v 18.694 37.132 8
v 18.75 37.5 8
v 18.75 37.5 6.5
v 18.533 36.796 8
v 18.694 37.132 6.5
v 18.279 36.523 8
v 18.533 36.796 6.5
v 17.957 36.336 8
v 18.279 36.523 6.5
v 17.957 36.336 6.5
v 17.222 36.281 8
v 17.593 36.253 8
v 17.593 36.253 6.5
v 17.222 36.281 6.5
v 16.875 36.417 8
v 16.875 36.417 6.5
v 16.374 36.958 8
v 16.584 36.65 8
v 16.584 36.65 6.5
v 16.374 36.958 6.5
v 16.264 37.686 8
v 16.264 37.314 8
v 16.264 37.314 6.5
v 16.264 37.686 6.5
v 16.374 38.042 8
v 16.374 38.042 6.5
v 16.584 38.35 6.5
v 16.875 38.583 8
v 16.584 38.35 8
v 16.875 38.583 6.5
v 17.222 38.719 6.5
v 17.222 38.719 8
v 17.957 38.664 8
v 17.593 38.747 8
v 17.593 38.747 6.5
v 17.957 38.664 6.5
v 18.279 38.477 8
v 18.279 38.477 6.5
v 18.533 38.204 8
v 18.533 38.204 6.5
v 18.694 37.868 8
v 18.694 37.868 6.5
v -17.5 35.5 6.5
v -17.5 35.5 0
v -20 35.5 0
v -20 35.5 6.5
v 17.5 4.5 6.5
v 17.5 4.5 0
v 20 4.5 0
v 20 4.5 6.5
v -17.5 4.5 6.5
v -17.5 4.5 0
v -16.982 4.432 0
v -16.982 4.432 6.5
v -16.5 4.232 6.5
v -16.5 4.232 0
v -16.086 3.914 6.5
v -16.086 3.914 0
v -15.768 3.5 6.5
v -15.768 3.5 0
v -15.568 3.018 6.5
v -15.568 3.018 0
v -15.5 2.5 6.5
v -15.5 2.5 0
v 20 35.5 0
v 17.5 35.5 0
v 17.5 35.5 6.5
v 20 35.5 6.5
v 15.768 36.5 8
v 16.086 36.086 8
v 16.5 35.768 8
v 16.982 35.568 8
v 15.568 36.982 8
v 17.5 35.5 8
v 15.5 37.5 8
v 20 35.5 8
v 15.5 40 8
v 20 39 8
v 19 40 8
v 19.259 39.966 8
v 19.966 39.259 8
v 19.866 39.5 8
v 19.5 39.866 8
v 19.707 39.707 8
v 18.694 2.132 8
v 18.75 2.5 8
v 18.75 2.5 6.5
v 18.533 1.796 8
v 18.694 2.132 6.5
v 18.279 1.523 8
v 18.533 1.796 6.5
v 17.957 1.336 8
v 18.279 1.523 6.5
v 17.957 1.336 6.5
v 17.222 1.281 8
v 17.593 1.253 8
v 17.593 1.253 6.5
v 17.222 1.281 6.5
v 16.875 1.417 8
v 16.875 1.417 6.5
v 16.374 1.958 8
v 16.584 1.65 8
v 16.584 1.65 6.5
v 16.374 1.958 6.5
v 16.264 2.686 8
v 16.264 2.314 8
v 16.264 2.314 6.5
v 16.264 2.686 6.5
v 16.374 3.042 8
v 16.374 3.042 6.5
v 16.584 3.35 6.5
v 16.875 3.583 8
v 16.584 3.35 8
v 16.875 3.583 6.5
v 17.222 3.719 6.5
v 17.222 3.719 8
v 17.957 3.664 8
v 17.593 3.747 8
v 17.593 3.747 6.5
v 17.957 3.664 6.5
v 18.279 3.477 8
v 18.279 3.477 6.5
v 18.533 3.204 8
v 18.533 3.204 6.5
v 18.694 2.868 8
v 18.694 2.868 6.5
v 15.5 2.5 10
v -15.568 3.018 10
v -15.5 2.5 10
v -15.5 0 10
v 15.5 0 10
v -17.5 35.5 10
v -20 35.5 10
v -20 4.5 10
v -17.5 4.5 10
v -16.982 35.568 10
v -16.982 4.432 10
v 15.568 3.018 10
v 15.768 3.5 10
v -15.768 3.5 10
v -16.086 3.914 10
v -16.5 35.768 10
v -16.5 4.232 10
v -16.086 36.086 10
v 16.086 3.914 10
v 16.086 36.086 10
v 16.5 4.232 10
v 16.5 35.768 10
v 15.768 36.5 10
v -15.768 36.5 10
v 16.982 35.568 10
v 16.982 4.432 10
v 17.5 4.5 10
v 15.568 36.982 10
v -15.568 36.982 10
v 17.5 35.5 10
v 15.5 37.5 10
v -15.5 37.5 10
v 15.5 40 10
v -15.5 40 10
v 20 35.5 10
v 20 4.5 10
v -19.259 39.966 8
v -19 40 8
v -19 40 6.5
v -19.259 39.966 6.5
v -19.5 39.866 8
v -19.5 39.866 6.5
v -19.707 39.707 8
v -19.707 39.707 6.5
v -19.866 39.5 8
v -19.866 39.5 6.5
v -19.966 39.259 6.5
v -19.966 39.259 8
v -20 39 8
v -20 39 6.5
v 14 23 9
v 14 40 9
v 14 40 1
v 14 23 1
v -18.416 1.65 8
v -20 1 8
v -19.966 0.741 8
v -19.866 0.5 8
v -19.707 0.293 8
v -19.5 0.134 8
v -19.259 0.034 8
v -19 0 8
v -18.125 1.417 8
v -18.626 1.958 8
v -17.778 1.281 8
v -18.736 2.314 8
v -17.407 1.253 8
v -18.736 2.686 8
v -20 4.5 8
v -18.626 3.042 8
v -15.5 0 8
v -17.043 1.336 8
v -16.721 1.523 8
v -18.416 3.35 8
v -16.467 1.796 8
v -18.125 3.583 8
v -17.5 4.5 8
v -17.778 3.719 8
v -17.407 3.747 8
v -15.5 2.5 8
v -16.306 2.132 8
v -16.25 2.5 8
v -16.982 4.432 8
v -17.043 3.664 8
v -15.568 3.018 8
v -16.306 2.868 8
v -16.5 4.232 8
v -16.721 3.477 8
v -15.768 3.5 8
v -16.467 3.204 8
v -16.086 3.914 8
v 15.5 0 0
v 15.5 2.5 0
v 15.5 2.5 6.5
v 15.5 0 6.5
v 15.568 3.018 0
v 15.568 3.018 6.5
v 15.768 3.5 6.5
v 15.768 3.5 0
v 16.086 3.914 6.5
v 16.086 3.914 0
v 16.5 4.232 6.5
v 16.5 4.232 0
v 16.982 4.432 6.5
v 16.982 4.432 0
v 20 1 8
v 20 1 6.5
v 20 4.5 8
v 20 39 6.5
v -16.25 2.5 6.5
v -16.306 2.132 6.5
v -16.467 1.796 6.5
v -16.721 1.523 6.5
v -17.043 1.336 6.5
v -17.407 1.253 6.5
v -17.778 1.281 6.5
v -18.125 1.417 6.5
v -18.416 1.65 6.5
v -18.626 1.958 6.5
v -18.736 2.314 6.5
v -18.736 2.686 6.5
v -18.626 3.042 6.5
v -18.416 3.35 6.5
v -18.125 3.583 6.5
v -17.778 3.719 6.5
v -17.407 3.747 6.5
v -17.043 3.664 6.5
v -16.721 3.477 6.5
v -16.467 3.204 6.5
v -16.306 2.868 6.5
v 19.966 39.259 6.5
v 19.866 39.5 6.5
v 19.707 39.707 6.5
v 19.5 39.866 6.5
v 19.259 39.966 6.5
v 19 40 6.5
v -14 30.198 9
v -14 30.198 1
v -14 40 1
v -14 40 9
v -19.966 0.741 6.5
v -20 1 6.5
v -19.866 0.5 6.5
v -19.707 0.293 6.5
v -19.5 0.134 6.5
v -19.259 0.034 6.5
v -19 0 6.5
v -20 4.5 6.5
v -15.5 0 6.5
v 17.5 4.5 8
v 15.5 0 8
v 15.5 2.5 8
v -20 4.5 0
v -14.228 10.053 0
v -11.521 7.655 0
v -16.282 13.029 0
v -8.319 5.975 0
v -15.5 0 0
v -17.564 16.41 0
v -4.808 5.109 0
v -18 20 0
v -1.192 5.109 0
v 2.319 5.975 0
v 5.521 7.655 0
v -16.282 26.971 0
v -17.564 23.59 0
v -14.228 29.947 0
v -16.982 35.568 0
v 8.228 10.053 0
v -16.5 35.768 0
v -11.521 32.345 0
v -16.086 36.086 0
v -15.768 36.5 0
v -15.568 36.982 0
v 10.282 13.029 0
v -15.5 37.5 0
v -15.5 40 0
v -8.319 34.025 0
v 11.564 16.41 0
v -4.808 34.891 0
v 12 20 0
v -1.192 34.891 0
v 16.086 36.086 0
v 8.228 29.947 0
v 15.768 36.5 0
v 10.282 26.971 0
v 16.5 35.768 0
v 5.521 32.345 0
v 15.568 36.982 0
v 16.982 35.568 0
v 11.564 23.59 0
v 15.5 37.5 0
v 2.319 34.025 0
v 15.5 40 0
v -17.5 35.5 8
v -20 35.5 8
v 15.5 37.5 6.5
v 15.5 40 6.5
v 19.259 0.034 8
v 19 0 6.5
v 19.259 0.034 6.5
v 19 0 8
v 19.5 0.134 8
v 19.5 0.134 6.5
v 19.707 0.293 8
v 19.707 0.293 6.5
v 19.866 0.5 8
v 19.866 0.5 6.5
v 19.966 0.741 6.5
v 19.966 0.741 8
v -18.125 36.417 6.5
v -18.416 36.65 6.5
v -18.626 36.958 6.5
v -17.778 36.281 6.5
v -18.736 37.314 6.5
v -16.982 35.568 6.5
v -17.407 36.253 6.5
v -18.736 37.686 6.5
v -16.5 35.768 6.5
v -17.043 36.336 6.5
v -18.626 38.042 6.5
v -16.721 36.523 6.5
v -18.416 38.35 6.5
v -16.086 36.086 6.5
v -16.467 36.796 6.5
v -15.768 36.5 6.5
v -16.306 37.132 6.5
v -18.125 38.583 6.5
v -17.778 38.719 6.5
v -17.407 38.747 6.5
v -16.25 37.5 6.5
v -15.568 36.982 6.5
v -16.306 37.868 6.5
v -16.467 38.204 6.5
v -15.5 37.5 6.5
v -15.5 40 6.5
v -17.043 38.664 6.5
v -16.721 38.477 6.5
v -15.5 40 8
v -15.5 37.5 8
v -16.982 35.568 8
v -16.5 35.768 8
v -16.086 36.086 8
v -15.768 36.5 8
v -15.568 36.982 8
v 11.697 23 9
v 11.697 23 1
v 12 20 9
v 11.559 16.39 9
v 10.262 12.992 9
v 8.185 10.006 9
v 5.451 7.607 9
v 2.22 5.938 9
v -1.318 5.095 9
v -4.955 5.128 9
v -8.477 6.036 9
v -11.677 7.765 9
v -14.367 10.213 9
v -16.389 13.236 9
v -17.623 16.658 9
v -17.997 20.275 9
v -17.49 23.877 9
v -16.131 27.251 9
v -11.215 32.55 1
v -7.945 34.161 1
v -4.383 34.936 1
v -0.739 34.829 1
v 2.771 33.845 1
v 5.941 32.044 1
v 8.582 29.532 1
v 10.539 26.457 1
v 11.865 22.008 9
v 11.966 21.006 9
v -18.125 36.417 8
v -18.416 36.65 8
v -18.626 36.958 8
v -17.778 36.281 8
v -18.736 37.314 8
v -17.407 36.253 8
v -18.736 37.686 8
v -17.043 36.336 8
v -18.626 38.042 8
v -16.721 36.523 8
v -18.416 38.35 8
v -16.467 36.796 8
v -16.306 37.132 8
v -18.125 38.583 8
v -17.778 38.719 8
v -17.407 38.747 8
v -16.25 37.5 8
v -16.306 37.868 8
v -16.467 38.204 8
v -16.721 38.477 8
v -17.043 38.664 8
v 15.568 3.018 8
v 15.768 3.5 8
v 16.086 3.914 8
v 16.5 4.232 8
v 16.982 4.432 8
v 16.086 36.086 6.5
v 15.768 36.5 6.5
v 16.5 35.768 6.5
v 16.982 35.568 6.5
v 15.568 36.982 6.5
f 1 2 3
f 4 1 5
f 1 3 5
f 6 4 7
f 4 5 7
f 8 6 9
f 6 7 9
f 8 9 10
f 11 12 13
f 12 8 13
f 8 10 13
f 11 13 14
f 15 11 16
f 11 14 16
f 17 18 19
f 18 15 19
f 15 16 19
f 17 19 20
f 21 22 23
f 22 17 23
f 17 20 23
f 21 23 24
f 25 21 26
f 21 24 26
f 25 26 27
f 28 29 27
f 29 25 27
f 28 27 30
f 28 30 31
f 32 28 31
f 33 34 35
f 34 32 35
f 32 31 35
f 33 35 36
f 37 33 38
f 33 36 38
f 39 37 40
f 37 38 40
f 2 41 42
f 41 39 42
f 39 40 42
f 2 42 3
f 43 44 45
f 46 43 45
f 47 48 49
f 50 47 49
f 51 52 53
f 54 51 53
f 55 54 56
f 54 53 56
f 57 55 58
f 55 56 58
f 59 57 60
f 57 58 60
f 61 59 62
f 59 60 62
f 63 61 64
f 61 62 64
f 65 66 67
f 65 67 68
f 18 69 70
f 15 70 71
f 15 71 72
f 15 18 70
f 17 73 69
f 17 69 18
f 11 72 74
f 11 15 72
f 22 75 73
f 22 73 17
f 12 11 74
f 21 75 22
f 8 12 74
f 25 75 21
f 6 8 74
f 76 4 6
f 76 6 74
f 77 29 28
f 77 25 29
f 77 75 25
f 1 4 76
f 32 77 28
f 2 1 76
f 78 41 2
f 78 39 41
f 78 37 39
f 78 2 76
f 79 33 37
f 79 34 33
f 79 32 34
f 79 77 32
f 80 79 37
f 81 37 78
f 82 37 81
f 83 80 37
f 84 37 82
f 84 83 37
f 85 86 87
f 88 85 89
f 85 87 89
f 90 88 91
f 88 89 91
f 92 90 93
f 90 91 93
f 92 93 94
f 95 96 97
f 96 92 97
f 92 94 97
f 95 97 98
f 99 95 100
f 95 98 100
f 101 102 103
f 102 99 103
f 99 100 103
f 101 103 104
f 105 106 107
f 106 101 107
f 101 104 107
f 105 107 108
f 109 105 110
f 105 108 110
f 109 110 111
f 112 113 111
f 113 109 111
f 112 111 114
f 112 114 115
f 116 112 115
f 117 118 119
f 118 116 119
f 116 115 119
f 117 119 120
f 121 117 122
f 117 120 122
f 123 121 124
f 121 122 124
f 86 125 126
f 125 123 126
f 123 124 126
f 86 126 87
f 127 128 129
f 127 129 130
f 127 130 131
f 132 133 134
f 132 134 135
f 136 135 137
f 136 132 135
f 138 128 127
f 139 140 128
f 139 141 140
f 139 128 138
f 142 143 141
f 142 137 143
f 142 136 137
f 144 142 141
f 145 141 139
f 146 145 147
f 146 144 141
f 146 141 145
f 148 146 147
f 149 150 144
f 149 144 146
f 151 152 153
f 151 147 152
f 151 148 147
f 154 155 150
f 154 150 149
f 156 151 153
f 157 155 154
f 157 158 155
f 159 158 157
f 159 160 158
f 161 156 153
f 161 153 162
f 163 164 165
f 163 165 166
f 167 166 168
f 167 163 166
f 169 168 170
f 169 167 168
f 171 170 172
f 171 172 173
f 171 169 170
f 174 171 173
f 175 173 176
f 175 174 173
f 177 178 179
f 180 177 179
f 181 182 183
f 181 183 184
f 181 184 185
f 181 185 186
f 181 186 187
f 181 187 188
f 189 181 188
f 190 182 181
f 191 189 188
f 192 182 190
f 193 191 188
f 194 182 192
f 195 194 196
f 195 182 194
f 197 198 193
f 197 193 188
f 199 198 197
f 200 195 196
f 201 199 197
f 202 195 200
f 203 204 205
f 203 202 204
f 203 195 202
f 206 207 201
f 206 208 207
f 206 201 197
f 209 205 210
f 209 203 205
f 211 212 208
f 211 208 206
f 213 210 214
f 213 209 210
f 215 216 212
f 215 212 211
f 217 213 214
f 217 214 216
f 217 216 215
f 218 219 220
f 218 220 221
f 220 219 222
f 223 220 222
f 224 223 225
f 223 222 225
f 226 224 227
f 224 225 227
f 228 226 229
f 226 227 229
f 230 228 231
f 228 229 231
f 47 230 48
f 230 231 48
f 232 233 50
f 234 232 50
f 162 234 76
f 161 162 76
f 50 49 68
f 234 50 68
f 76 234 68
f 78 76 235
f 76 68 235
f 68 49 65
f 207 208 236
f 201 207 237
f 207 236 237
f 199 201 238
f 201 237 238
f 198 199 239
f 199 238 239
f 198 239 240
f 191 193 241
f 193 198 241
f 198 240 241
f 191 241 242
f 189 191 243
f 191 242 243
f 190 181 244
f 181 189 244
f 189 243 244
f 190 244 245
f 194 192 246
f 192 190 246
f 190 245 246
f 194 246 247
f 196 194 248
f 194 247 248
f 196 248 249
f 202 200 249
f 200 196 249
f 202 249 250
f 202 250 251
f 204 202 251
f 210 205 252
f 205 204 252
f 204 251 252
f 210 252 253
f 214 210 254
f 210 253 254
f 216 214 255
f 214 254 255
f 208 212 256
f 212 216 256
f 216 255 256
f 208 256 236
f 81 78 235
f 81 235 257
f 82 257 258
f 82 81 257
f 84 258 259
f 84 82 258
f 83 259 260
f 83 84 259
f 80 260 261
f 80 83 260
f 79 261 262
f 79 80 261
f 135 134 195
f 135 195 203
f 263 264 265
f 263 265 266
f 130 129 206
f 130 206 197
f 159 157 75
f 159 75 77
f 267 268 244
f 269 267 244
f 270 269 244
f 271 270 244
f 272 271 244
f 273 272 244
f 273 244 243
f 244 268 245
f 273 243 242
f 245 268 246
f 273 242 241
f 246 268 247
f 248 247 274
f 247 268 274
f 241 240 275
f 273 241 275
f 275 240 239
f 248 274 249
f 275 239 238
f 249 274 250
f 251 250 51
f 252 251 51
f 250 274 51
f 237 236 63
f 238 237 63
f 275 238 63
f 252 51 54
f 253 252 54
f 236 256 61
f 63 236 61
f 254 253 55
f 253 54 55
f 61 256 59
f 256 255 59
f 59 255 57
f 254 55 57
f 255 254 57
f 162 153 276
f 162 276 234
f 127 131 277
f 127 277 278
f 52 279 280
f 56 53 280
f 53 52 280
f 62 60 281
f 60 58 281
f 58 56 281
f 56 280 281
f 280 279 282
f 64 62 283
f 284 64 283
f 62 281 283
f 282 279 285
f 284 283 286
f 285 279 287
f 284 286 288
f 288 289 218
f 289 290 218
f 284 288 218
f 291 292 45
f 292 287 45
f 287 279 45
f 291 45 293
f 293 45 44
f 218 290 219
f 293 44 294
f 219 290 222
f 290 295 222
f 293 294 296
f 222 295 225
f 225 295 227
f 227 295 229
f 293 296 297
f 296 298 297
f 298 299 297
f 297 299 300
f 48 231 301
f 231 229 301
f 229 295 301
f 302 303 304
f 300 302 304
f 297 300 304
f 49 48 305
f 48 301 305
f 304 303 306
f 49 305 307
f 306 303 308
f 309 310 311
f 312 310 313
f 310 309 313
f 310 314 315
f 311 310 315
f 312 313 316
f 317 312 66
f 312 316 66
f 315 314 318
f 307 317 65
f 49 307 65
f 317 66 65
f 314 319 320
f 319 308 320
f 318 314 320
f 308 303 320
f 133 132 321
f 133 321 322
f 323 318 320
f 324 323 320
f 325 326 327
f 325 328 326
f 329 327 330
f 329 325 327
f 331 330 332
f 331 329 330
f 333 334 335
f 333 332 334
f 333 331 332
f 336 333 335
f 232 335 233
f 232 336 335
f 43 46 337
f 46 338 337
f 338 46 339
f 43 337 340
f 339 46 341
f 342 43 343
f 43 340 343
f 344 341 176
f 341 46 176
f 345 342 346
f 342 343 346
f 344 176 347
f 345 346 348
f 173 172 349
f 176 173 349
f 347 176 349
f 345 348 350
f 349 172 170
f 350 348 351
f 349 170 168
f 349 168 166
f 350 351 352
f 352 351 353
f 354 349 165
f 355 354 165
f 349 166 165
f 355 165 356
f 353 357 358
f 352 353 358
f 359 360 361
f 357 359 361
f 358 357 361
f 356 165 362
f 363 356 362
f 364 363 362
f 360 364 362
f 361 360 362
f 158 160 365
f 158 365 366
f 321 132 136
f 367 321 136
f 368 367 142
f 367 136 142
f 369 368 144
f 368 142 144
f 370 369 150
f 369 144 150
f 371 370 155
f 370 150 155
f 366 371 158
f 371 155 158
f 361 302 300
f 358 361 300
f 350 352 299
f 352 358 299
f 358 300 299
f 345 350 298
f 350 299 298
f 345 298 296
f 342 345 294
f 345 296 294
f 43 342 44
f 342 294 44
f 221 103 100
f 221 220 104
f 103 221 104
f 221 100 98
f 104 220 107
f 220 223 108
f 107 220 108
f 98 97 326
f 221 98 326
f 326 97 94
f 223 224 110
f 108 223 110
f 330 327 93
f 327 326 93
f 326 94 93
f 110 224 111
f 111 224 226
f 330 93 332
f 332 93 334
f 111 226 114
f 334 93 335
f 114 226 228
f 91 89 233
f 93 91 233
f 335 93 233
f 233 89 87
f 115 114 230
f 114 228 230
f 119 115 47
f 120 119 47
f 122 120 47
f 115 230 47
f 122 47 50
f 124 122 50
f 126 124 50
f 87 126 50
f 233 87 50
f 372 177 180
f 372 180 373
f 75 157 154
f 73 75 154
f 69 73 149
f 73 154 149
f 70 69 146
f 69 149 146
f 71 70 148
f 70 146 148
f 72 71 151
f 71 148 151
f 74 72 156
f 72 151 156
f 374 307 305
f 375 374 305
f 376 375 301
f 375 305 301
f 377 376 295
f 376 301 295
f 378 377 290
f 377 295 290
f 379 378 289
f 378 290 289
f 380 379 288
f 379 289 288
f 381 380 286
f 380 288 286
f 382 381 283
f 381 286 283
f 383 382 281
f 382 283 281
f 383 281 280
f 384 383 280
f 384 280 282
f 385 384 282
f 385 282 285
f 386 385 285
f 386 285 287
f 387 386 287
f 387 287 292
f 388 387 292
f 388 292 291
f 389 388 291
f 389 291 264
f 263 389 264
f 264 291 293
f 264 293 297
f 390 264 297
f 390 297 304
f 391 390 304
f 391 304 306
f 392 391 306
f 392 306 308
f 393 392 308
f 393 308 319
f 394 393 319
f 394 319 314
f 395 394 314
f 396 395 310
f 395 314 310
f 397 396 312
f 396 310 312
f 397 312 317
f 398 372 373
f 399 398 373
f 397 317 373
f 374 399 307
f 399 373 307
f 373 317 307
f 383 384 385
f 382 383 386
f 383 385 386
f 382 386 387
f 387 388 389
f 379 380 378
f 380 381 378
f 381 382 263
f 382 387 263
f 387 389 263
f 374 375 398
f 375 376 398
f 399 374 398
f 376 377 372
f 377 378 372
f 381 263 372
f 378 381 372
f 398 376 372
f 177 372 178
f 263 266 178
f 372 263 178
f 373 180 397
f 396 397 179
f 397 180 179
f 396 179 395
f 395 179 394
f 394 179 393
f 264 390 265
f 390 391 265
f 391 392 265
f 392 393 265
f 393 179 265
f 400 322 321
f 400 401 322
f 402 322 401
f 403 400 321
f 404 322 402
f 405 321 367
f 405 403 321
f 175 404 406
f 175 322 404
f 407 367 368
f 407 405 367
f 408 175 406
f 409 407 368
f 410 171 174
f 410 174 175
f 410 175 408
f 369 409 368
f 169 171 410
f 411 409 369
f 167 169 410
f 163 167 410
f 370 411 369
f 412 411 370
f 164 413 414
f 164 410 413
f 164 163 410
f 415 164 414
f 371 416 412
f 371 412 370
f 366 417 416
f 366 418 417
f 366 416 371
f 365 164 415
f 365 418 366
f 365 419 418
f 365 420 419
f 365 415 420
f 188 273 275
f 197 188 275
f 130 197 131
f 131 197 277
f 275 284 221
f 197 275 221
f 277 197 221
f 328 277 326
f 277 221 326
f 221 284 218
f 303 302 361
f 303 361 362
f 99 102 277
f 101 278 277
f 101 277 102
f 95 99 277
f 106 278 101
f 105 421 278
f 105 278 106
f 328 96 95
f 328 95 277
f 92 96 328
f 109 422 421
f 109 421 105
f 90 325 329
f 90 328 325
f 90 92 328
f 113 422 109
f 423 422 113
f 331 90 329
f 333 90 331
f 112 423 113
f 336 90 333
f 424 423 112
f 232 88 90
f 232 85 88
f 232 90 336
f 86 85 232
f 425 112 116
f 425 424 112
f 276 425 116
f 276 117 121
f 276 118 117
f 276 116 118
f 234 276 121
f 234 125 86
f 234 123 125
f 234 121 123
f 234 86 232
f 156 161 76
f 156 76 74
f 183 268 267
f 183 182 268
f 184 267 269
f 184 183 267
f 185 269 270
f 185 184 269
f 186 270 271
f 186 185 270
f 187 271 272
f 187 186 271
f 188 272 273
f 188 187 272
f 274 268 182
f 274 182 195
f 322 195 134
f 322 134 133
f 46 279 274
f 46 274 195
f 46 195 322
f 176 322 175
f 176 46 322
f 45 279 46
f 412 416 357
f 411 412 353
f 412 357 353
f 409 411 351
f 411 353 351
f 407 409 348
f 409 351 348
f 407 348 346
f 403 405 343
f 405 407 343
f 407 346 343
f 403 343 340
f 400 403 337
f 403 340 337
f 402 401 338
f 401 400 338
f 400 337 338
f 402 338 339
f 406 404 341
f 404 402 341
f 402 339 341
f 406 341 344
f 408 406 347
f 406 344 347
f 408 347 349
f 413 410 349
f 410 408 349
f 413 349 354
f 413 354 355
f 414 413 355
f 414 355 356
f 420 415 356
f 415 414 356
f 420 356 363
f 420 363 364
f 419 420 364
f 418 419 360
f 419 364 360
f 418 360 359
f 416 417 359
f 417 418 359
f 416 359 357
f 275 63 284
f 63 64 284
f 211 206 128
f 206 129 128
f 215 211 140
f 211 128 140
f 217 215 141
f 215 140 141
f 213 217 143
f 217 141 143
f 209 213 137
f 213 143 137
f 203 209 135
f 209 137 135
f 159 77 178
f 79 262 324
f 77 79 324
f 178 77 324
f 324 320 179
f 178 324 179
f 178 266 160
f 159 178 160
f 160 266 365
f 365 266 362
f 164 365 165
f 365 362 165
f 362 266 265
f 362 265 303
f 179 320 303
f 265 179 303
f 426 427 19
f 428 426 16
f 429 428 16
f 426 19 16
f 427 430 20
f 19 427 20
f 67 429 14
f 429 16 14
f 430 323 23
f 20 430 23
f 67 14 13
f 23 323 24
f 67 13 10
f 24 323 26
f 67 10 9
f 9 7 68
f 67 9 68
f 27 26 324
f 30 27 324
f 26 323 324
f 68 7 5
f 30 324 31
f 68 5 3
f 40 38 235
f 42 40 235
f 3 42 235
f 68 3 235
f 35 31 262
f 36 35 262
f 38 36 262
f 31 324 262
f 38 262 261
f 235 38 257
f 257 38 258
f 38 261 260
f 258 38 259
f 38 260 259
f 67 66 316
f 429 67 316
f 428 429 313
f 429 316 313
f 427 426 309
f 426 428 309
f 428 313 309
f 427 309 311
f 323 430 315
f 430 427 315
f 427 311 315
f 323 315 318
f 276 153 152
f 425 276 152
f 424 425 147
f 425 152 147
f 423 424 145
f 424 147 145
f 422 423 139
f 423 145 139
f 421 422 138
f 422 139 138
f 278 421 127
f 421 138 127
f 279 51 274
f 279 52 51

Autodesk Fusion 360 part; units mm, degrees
sketch "Sketch1" plane through (0, 0, 0) normal (0, 0, 1) x (1, 0, 0)
  line L0 (0, 0) -> (20, 0)
  line L1 (20, 0) -> (20, 40)
  line L2 (20, 40) -> (0, 40)
  line L3 (0, 40) -> (0, 0)
  line L4 (0, 0) -> (-20, 0)
  line L5 (-20, 0) -> (-20, 40)
  line L6 (-20, 40) -> (0, 40)
  line L7 (0, 40) -> (0, 0)
  circle A0 centre (-3, 20) radius 15
  circle A1 centre (17.5, 37.5) radius 2
  circle A2 centre (-17.5, 37.5) radius 2
  circle A3 centre (-17.5, 2.5) radius 2
  circle A4 centre (17.5, 2.5) radius 2
  line L8 (17.5, 37.5) -> (17.5, 2.5) construction
  line L9 (17.5, 2.5) -> (-17.5, 2.5) construction
  line L10 (-17.5, 37.5) -> (17.5, 37.5) construction
  circle A5 centre (17.5, 37.5) radius 1.25
  circle A6 centre (-17.5, 37.5) radius 1.25
  circle A7 centre (-17.5, 2.5) radius 1.25
  circle A8 centre (17.5, 2.5) radius 1.25
  line L11 (15.5, 37.5) -> (15.5, 40)
  line L12 (17.5, 35.5) -> (20, 35.5)
  line L13 (17.5, 4.5) -> (20, 4.5)
  line L14 (15.5, 2.5) -> (15.5, 0)
  line L15 (-15.5, 2.5) -> (-15.5, 0)
  line L16 (-17.5, 4.5) -> (-20, 4.5)
  line L17 (-17.5, 35.5) -> (-20, 35.5)
  line L18 (-15.5, 37.5) -> (-15.5, 40)
  dimension "d1" = 40
  dimension "d2" = 40
  dimension "d5" = 30
  dimension "d14" = 17.5
  dimension "d16" = 2.5
  dimension "d17" = 2.5
  dimension "d18" = 2.5
  dimension "d19" = 4
  dimension "d29" = 20
  dimension "d30" = 17
extrude "Extrude1" add sketch "Sketch1" along normal blind 10 contours L0 L1 L2 L3 L7 A0 A1 A4 L11 L12 L13 L14 | L3 L4 L5 L6 L7 A0 A2 A3 L15 L16 L17 L18 | L0 L1 A4 L13 L14 | L3 L7 A0 | L3 L7 A0 | L4 L5 A3 L15 L16 | A4 | A3 | L1 L2 A1 L11 L12 | L5 L6 A2 L17 L18 | A1 | A2 | A5 | A6 | A7 | A8
extrude "Extrude2" cut sketch "Sketch1" along normal blind 9 contours L3 L7 A0 | L3 L7 A0
sketch "Sketch2" plane through (0, 40, 0) normal (0, 1, 0) x (-1, 0, 0)
  line L0 (-20, 0) -> (20, 0)
  line L1 (20, 0) -> (20, 10)
  line L2 (20, 10) -> (-20, 10)
  line L3 (-20, 10) -> (-20, 0)
  line L4 (-14, 1) -> (14, 1)
  line L5 (14, 1) -> (14, 9)
  line L6 (14, 9) -> (-14, 9)
  line L7 (-14, 9) -> (-14, 1)
  line L8 (-14, 1) -> (14, 9) construction
  line L9 (14, 1) -> (-14, 9) construction
  line L10 (0, 5) -> (0, 0) construction
  line L11 (0, 5) -> (-20, 5) construction
  point P0 (0, 5)
  dimension "d9" = 28
  dimension "d10" = 8
extrude "Extrude3" cut sketch "Sketch2" against normal blind 17 contours L4 L5 L6 L7
extrude "Extrude4" cut sketch "Sketch1" along normal blind 6.5 contours L0 L1 A4 L13 L14 | L4 L5 A3 L15 L16 | A4 | A3 | L1 L2 A1 L11 L12 | L5 L6 A2 L17 L18 | A1 | A2 | A5 | A6 | A7 | A8
extrude "Extrude5" cut sketch "Sketch1" along normal blind 44 contours A5 | A6 | A7 | A8
sketch "Sketch3" plane through (0, 0, 10) normal (0, 0, 1) x (1, 0, 0)
  circle A0 centre (-17.5, 37.5) radius 1.25
  circle A1 centre (-17.5, 2.5) radius 1.25
  circle A2 centre (17.5, 37.5) radius 1.25
  circle A3 centre (17.5, 2.5) radius 1.25
  line L0 (-20, 0) -> (20, 0)
  line L1 (20, 0) -> (20, 40)
  line L2 (20, 40) -> (-20, 40)
  line L3 (-20, 40) -> (-20, 0)
  circle A4 centre (-17.5, 37.5) radius 1.25
  arc A5 (-17.5, 35.5) -> (-15.5, 37.5) centre (-17.5, 37.5) ccw
  line L4 (-17.5, 35.5) -> (-20, 35.5)
  line L5 (-20, 35.5) -> (-20, 40)
  line L6 (-20, 40) -> (-15.5, 40)
  line L7 (-15.5, 40) -> (-15.5, 37.5)
  circle A6 centre (17.5, 37.5) radius 1.25
  arc A7 (15.5, 37.5) -> (17.5, 35.5) centre (17.5, 37.5) ccw
  line L8 (15.5, 37.5) -> (15.5, 40)
  line L9 (15.5, 40) -> (20, 40)
  line L10 (20, 40) -> (20, 35.5)
  line L11 (20, 35.5) -> (17.5, 35.5)
  circle A8 centre (-17.5, 2.5) radius 1.25
  arc A9 (-15.5, 2.5) -> (-17.5, 4.5) centre (-17.5, 2.5) ccw
  line L12 (-15.5, 2.5) -> (-15.5, 0)
  line L13 (-15.5, 0) -> (-20, 0)
  line L14 (-20, 0) -> (-20, 4.5)
  line L15 (-20, 4.5) -> (-17.5, 4.5)
  circle A10 centre (17.5, 2.5) radius 1.25
  arc A11 (17.5, 4.5) -> (15.5, 2.5) centre (17.5, 2.5) ccw
  line L16 (17.5, 4.5) -> (20, 4.5)
  line L17 (20, 4.5) -> (20, 0)
  line L18 (20, 0) -> (15.5, 0)
  line L19 (15.5, 0) -> (15.5, 2.5)
extrude "Extrude6" cut sketch "Sketch3" against normal blind 2 contours L0 L3 A9 L12 L13 L14 L15 | L0 L1 A11 L16 L17 L18 L19 | L2 L3 A5 L4 L5 L6 L7 | L1 L2 A7 L8 L9 L10 L11
fillet "Fillet1" radius 1 4 edges at (-20, 0, 7.25) (-20, 40, 7.25) (20, 0, 7.25) (20, 40, 7.25)
equation "d11 = -34.00 mm / 2"
